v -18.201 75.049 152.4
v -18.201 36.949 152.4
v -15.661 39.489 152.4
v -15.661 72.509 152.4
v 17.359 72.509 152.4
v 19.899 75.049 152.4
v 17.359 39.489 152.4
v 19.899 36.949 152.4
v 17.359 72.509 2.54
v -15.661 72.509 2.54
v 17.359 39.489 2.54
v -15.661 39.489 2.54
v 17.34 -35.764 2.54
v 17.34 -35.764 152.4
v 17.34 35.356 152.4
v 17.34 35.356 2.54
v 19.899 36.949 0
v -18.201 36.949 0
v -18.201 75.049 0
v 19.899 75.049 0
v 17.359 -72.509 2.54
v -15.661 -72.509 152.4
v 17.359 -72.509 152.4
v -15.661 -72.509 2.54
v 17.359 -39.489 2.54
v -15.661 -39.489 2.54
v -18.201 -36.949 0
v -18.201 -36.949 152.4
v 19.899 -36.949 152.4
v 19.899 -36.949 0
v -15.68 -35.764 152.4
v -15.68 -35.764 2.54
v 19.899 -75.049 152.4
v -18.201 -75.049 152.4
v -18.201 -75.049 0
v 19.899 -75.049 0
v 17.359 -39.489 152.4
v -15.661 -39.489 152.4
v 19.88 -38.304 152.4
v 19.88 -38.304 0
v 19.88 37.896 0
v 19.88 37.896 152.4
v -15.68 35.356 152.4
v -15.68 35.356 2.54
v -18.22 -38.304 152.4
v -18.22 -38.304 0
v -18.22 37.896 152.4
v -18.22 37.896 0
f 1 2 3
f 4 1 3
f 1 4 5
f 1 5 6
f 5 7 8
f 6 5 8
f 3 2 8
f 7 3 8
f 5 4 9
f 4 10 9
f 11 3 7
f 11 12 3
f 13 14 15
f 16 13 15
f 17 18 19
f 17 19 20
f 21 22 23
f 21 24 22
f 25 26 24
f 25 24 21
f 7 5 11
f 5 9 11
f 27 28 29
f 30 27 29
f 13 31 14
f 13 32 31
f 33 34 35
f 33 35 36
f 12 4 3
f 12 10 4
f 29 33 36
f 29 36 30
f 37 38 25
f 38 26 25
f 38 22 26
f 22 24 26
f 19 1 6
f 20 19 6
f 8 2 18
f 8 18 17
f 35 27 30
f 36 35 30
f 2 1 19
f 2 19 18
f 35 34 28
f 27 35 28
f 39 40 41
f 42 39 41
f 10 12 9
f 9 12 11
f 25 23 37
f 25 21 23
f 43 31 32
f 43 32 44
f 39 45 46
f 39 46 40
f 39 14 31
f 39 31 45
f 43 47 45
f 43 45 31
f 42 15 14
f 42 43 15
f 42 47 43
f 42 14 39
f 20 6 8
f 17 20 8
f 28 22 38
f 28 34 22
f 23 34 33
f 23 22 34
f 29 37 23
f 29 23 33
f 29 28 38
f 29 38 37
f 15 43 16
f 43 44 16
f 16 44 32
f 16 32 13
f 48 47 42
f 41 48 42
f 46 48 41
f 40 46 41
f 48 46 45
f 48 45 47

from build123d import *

# Parameters (mm, degrees)
F0_W     = 38.1
F0_H     = 38.1
F1_DEPTH = 152.4
F2_T     = -2.54
F4_W     = 38.1
F4_H     = 76.2
F5_DEPTH = 152.4
F6_T     = -2.54


with BuildPart() as f1:
    # F0 (on Top) → F1 (new body)
    with BuildSketch(Plane.XY):
        with Locations((0.848638, -55.999441)):
            Rectangle(F0_W, F0_H)
    extrude(amount=F1_DEPTH)

    # F2
    f2_openings = [f1.faces().sort_by_distance(p)[0] for p in [
        (0.848638, -55.999441, 152.4),
    ]]
    offset(amount=F2_T, openings=f2_openings)


with BuildPart() as f3_1:
    # F3: instance of F1
    add(f1.part.mirror(Plane.XZ))


with BuildPart() as f5:
    # F4 (on Top) → F5 (new body)
    with BuildSketch(Plane.XY):
        with Locations((0.829771, -0.203904)):
            Rectangle(F4_W, F4_H)
    extrude(amount=F5_DEPTH)

    # F6
    f6_openings = [f5.faces().sort_by_distance(p)[0] for p in [
        (0.829771, -0.203904, 152.4),
    ]]
    offset(amount=F6_T, openings=f6_openings)


solid = Compound([f1.part, f3_1.part, f5.part])
